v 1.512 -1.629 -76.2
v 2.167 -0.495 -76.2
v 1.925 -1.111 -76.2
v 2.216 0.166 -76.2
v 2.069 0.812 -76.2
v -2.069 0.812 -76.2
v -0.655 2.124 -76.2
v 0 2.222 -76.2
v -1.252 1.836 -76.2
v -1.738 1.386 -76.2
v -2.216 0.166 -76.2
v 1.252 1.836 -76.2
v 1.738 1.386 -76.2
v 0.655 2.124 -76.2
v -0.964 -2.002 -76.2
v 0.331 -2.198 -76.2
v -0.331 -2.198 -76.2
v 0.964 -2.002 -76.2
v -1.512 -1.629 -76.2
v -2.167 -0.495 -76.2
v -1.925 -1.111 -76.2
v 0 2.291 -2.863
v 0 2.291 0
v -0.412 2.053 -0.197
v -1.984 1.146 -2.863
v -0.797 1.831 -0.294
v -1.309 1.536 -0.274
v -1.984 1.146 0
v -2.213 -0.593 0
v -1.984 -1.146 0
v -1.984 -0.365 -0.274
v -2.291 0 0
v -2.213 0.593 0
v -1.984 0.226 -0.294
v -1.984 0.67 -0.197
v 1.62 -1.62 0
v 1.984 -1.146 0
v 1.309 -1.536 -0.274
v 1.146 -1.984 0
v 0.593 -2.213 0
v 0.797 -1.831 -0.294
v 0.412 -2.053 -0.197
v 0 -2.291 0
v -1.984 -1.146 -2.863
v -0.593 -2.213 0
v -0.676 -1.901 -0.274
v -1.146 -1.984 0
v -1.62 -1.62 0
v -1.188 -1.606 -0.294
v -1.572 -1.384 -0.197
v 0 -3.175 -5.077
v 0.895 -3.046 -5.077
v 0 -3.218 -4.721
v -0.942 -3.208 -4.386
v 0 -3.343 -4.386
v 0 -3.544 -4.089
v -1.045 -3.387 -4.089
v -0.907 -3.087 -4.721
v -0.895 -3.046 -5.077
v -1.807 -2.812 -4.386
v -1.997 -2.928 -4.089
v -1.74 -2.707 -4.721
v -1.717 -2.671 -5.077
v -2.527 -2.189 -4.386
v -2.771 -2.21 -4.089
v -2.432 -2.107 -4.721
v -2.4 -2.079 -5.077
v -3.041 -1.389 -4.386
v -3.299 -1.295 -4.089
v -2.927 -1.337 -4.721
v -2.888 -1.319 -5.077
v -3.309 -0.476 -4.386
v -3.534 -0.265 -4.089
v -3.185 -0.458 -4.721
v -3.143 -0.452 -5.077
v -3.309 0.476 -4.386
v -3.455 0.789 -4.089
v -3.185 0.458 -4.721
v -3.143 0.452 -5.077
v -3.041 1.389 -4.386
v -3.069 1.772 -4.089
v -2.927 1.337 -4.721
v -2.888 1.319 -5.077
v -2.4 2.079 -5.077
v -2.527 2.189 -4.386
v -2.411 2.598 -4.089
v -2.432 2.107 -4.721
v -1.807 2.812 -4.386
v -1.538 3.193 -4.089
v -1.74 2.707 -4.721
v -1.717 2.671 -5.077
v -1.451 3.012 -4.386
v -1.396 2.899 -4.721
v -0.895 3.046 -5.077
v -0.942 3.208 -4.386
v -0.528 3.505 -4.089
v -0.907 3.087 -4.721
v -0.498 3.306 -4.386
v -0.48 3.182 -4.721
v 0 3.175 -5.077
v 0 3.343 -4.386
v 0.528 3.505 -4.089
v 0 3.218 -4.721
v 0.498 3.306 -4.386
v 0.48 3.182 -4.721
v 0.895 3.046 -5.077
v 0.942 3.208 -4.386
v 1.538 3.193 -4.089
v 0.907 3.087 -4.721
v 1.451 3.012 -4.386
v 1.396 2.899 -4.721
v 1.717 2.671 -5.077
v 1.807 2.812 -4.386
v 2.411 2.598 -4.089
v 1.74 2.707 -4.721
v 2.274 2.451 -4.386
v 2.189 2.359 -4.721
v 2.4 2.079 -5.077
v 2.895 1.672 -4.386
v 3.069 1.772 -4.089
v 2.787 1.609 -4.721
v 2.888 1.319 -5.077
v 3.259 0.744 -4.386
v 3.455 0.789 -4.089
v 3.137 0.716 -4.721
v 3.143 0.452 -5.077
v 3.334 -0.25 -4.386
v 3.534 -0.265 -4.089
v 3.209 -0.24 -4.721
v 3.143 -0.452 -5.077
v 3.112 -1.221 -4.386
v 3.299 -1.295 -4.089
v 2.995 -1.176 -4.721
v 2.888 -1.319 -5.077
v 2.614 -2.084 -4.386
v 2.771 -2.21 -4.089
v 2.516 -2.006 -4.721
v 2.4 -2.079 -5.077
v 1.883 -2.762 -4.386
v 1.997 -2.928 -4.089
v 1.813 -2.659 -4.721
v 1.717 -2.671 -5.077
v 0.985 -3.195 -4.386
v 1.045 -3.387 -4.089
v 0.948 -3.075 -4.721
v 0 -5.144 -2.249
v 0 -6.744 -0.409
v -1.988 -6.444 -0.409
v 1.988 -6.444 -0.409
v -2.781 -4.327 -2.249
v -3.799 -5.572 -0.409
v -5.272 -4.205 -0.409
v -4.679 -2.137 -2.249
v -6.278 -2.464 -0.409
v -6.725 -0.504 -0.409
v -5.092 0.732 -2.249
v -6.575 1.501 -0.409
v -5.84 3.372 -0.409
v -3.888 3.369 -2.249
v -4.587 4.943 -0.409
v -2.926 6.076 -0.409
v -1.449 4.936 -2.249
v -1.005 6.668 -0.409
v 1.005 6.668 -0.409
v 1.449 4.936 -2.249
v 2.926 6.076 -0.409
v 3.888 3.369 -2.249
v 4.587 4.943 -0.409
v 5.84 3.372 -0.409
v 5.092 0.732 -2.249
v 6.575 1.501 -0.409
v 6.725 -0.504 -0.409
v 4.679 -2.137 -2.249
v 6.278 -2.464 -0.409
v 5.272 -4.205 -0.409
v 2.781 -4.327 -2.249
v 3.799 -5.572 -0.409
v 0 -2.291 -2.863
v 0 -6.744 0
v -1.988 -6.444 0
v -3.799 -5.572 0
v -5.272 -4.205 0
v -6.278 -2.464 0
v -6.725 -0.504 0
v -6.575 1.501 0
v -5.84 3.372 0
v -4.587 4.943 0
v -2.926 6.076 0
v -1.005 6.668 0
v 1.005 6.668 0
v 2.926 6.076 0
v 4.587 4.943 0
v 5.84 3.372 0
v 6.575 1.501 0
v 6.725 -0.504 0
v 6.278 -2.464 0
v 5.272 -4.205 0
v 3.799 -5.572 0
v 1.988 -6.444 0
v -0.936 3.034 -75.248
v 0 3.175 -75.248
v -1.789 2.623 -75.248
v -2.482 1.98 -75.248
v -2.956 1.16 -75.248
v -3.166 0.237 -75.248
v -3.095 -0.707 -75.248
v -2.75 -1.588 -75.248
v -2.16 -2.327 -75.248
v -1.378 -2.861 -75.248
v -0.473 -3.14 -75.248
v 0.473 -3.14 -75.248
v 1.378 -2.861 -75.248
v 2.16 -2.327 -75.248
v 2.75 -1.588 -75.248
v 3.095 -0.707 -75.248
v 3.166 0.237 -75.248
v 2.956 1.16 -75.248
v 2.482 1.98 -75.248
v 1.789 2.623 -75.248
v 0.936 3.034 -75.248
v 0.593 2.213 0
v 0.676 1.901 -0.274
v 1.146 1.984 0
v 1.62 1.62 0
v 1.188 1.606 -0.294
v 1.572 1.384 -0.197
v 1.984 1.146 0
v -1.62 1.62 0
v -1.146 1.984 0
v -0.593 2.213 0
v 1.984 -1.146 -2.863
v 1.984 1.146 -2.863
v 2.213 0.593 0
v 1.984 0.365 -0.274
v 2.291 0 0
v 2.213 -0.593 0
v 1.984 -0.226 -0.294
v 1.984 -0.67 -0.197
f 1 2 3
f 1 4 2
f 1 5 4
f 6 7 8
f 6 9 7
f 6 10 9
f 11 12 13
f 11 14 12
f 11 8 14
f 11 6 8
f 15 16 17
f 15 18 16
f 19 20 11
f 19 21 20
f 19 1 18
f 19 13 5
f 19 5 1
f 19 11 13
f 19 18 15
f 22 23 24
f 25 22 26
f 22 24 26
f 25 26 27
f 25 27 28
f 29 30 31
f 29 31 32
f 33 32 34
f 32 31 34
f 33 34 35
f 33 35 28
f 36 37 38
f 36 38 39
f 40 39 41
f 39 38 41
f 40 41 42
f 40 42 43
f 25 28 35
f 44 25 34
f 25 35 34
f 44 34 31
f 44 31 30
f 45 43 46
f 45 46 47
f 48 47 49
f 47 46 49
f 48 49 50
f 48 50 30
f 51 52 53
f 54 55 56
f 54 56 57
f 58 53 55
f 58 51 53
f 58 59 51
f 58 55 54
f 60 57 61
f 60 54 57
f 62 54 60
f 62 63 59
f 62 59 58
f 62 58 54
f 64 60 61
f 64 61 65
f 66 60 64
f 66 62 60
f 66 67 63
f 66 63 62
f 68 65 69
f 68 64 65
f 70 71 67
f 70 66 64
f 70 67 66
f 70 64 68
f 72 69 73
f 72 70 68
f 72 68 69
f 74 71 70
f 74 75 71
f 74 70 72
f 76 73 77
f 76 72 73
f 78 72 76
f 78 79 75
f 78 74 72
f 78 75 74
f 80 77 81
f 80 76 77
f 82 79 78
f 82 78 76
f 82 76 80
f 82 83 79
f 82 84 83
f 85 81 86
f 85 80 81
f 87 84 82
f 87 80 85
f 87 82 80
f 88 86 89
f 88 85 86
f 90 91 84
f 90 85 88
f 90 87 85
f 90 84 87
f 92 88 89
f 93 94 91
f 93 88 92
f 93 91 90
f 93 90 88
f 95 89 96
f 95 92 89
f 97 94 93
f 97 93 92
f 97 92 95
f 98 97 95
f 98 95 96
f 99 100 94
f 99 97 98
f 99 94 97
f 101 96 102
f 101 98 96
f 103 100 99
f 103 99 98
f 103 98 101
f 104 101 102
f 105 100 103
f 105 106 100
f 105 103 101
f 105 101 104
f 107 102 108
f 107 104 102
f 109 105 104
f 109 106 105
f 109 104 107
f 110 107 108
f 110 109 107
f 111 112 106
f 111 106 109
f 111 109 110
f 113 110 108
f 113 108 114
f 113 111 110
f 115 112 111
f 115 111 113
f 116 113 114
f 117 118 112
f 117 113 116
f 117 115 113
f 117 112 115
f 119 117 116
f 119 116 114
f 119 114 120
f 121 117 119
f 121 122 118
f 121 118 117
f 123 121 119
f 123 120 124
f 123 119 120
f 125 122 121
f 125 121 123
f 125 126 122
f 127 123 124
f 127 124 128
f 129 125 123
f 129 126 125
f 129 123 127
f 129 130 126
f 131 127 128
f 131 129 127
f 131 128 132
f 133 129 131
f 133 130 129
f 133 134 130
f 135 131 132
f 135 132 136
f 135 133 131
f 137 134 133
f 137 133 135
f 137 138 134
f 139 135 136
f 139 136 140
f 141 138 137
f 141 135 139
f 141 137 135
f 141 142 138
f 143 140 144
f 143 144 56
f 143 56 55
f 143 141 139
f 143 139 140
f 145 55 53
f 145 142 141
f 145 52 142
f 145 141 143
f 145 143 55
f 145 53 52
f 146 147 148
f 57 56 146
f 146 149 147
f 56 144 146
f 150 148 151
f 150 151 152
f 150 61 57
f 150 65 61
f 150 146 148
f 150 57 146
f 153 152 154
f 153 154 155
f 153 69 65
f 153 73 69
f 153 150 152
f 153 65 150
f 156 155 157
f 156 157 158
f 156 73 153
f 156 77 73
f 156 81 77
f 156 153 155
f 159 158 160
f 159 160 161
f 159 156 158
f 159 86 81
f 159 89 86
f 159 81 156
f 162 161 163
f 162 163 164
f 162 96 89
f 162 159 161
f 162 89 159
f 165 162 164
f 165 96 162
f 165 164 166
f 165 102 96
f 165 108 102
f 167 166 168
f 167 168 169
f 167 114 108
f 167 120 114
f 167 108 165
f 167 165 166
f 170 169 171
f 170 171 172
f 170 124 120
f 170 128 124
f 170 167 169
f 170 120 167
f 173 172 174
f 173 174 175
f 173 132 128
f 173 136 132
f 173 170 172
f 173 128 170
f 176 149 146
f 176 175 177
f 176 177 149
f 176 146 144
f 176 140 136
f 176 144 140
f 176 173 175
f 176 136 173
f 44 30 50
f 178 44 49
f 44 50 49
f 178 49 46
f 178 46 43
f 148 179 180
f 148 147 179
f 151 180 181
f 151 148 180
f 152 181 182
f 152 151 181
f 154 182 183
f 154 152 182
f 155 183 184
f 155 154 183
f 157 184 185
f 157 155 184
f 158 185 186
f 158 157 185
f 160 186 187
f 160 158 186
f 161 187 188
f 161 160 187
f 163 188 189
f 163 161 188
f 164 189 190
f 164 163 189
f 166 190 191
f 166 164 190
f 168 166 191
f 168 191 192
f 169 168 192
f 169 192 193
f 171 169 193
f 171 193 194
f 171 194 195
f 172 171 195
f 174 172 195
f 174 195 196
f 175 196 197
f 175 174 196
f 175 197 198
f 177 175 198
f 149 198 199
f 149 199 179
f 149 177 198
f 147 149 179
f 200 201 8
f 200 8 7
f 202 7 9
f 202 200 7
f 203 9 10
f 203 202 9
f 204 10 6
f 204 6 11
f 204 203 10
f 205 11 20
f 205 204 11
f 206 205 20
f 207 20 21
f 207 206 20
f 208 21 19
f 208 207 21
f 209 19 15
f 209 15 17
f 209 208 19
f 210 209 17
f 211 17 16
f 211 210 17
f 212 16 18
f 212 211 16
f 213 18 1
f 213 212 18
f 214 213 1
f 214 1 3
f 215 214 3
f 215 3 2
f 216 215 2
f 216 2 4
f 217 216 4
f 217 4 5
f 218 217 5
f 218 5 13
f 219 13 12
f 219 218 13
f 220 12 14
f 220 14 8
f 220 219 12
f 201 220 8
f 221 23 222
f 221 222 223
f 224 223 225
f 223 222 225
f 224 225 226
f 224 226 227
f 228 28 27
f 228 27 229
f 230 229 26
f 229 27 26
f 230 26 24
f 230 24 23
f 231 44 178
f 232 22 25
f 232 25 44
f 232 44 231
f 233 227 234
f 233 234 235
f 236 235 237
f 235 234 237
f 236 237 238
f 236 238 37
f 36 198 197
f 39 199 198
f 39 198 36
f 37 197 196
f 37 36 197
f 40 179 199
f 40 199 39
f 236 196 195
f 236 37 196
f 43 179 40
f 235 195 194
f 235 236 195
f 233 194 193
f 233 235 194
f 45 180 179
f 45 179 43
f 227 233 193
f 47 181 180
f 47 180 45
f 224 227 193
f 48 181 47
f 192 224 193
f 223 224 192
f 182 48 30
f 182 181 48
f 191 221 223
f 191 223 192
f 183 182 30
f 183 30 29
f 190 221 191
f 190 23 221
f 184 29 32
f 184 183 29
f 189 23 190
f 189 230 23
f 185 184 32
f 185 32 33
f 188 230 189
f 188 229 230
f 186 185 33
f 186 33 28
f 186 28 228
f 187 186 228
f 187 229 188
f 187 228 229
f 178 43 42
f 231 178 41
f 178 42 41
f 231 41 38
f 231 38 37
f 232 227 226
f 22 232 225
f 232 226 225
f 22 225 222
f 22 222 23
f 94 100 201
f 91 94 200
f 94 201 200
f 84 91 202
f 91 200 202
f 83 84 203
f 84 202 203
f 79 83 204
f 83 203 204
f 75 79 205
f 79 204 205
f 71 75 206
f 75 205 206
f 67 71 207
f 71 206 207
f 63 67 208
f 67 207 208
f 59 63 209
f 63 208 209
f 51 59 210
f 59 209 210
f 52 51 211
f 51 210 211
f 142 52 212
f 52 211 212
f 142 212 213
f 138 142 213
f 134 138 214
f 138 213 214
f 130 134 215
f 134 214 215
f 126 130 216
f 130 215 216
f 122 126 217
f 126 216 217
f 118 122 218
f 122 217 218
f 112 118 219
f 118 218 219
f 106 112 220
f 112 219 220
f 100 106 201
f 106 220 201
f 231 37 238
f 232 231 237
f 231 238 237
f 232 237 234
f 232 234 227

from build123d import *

# Parameters (mm, degrees)
SKETCH1_W           = 76.2
SKETCH1_H           = 3.175
CHAMFER1_SIZE       = 0.9525
CUT_EXTRUDE2_DEPTH  = 2.86258
BOSS_EXTRUDE2_START = -45.722795596
SKETCH9_R           = 3.175
BOSS_EXTRUDE2_DEPTH = 45.722795596


with BuildPart() as part:
    # Sketch1 → Revolve1 (revolve)
    with BuildSketch(Plane(origin=(0, 0, 0), x_dir=(0, 0, -1), z_dir=(1, 0, 0))):
        with Locations((38.1, 1.5875)):
            Rectangle(SKETCH1_W, SKETCH1_H)
    revolve(axis=Axis((0, 0, -76.2), (0, 0, 1)))

    # Chamfer1
    chamfer1_edges = [part.edges().sort_by_distance(p)[0] for p in [
        (0, -3.175, -76.2),
    ]]
    chamfer(chamfer1_edges, length=CHAMFER1_SIZE)

    # Sketch7 → Revolve2 (revolve)
    with BuildSketch(Plane(origin=(0, 0, 0), x_dir=(0, 0, -1), z_dir=(1, 0, 0)), mode=Mode.PRIVATE) as revolve2_sk:
        with BuildLine():
            Line((0, 6.7437), (0.40894, 6.7437))
            Line((0.40894, 6.7437), (4.0894, 3.544324933))
            ThreePointArc((4.0894, 3.544324933), (4.549909788, 3.270350399), (5.077204404, 3.175))
            Line((5.077204404, 3.175), (5.077204404, 0))
            Line((5.077204404, 0), (0, 0))
            Line((0, 0), (0, 6.7437))
        make_face()
    revolve(revolve2_sk.sketch.rotate(Axis((0, 0, 0), (0, 0, -1)), 180), axis=Axis((0, 0, 0), (0, 0, -1)))

    # Boss-Extrude1 cone 1 section (through the dimple's axis) → Boss-Extrude1 (revolve)
    with BuildSketch(Plane(origin=(0, 0, -5.077204404), x_dir=(0, -1, 0), z_dir=(1, 0, 0))):
        Polygon((0, 0), (3.175, 0), (0, 3.175), align=None)
    revolve(axis=Axis((0, 0, -5.077204404), (0, 0, -1)))

    # Sketch5 → Cut-Extrude2 (cut)
    with BuildSketch(Plane.XY):
        Polygon((1.984375, -1.14567944), (1.984375, 1.14567944), (0, 2.291358881), (-1.984375, 1.14567944), (-1.984375, -1.14567944), (0, -2.291358881), align=None)
    extrude(amount=-CUT_EXTRUDE2_DEPTH, mode=Mode.SUBTRACT)

    # Cut-Extrude3 cone 1 section (through the dimple's axis) → Cut-Extrude3 (revolve, cut)
    with BuildSketch(Plane(origin=(0, 0, 0), x_dir=(0, -1, 0), z_dir=(1, 0, 0))):
        Polygon((0, 0), (2.291358881, 0), (0, 2.291358881), align=None)
    revolve(axis=Axis((0, 0, 0), (0, 0, -1)), mode=Mode.SUBTRACT)

    # Sketch9 → Boss-Extrude2 (add)
    with BuildSketch(Plane.XY.offset(-5.077204404).offset(BOSS_EXTRUDE2_START)):
        with Locations(Location((0, 0, 0), (0, 0, 90))):
            Circle(SKETCH9_R)
    extrude(amount=BOSS_EXTRUDE2_DEPTH)


solid = part.part
